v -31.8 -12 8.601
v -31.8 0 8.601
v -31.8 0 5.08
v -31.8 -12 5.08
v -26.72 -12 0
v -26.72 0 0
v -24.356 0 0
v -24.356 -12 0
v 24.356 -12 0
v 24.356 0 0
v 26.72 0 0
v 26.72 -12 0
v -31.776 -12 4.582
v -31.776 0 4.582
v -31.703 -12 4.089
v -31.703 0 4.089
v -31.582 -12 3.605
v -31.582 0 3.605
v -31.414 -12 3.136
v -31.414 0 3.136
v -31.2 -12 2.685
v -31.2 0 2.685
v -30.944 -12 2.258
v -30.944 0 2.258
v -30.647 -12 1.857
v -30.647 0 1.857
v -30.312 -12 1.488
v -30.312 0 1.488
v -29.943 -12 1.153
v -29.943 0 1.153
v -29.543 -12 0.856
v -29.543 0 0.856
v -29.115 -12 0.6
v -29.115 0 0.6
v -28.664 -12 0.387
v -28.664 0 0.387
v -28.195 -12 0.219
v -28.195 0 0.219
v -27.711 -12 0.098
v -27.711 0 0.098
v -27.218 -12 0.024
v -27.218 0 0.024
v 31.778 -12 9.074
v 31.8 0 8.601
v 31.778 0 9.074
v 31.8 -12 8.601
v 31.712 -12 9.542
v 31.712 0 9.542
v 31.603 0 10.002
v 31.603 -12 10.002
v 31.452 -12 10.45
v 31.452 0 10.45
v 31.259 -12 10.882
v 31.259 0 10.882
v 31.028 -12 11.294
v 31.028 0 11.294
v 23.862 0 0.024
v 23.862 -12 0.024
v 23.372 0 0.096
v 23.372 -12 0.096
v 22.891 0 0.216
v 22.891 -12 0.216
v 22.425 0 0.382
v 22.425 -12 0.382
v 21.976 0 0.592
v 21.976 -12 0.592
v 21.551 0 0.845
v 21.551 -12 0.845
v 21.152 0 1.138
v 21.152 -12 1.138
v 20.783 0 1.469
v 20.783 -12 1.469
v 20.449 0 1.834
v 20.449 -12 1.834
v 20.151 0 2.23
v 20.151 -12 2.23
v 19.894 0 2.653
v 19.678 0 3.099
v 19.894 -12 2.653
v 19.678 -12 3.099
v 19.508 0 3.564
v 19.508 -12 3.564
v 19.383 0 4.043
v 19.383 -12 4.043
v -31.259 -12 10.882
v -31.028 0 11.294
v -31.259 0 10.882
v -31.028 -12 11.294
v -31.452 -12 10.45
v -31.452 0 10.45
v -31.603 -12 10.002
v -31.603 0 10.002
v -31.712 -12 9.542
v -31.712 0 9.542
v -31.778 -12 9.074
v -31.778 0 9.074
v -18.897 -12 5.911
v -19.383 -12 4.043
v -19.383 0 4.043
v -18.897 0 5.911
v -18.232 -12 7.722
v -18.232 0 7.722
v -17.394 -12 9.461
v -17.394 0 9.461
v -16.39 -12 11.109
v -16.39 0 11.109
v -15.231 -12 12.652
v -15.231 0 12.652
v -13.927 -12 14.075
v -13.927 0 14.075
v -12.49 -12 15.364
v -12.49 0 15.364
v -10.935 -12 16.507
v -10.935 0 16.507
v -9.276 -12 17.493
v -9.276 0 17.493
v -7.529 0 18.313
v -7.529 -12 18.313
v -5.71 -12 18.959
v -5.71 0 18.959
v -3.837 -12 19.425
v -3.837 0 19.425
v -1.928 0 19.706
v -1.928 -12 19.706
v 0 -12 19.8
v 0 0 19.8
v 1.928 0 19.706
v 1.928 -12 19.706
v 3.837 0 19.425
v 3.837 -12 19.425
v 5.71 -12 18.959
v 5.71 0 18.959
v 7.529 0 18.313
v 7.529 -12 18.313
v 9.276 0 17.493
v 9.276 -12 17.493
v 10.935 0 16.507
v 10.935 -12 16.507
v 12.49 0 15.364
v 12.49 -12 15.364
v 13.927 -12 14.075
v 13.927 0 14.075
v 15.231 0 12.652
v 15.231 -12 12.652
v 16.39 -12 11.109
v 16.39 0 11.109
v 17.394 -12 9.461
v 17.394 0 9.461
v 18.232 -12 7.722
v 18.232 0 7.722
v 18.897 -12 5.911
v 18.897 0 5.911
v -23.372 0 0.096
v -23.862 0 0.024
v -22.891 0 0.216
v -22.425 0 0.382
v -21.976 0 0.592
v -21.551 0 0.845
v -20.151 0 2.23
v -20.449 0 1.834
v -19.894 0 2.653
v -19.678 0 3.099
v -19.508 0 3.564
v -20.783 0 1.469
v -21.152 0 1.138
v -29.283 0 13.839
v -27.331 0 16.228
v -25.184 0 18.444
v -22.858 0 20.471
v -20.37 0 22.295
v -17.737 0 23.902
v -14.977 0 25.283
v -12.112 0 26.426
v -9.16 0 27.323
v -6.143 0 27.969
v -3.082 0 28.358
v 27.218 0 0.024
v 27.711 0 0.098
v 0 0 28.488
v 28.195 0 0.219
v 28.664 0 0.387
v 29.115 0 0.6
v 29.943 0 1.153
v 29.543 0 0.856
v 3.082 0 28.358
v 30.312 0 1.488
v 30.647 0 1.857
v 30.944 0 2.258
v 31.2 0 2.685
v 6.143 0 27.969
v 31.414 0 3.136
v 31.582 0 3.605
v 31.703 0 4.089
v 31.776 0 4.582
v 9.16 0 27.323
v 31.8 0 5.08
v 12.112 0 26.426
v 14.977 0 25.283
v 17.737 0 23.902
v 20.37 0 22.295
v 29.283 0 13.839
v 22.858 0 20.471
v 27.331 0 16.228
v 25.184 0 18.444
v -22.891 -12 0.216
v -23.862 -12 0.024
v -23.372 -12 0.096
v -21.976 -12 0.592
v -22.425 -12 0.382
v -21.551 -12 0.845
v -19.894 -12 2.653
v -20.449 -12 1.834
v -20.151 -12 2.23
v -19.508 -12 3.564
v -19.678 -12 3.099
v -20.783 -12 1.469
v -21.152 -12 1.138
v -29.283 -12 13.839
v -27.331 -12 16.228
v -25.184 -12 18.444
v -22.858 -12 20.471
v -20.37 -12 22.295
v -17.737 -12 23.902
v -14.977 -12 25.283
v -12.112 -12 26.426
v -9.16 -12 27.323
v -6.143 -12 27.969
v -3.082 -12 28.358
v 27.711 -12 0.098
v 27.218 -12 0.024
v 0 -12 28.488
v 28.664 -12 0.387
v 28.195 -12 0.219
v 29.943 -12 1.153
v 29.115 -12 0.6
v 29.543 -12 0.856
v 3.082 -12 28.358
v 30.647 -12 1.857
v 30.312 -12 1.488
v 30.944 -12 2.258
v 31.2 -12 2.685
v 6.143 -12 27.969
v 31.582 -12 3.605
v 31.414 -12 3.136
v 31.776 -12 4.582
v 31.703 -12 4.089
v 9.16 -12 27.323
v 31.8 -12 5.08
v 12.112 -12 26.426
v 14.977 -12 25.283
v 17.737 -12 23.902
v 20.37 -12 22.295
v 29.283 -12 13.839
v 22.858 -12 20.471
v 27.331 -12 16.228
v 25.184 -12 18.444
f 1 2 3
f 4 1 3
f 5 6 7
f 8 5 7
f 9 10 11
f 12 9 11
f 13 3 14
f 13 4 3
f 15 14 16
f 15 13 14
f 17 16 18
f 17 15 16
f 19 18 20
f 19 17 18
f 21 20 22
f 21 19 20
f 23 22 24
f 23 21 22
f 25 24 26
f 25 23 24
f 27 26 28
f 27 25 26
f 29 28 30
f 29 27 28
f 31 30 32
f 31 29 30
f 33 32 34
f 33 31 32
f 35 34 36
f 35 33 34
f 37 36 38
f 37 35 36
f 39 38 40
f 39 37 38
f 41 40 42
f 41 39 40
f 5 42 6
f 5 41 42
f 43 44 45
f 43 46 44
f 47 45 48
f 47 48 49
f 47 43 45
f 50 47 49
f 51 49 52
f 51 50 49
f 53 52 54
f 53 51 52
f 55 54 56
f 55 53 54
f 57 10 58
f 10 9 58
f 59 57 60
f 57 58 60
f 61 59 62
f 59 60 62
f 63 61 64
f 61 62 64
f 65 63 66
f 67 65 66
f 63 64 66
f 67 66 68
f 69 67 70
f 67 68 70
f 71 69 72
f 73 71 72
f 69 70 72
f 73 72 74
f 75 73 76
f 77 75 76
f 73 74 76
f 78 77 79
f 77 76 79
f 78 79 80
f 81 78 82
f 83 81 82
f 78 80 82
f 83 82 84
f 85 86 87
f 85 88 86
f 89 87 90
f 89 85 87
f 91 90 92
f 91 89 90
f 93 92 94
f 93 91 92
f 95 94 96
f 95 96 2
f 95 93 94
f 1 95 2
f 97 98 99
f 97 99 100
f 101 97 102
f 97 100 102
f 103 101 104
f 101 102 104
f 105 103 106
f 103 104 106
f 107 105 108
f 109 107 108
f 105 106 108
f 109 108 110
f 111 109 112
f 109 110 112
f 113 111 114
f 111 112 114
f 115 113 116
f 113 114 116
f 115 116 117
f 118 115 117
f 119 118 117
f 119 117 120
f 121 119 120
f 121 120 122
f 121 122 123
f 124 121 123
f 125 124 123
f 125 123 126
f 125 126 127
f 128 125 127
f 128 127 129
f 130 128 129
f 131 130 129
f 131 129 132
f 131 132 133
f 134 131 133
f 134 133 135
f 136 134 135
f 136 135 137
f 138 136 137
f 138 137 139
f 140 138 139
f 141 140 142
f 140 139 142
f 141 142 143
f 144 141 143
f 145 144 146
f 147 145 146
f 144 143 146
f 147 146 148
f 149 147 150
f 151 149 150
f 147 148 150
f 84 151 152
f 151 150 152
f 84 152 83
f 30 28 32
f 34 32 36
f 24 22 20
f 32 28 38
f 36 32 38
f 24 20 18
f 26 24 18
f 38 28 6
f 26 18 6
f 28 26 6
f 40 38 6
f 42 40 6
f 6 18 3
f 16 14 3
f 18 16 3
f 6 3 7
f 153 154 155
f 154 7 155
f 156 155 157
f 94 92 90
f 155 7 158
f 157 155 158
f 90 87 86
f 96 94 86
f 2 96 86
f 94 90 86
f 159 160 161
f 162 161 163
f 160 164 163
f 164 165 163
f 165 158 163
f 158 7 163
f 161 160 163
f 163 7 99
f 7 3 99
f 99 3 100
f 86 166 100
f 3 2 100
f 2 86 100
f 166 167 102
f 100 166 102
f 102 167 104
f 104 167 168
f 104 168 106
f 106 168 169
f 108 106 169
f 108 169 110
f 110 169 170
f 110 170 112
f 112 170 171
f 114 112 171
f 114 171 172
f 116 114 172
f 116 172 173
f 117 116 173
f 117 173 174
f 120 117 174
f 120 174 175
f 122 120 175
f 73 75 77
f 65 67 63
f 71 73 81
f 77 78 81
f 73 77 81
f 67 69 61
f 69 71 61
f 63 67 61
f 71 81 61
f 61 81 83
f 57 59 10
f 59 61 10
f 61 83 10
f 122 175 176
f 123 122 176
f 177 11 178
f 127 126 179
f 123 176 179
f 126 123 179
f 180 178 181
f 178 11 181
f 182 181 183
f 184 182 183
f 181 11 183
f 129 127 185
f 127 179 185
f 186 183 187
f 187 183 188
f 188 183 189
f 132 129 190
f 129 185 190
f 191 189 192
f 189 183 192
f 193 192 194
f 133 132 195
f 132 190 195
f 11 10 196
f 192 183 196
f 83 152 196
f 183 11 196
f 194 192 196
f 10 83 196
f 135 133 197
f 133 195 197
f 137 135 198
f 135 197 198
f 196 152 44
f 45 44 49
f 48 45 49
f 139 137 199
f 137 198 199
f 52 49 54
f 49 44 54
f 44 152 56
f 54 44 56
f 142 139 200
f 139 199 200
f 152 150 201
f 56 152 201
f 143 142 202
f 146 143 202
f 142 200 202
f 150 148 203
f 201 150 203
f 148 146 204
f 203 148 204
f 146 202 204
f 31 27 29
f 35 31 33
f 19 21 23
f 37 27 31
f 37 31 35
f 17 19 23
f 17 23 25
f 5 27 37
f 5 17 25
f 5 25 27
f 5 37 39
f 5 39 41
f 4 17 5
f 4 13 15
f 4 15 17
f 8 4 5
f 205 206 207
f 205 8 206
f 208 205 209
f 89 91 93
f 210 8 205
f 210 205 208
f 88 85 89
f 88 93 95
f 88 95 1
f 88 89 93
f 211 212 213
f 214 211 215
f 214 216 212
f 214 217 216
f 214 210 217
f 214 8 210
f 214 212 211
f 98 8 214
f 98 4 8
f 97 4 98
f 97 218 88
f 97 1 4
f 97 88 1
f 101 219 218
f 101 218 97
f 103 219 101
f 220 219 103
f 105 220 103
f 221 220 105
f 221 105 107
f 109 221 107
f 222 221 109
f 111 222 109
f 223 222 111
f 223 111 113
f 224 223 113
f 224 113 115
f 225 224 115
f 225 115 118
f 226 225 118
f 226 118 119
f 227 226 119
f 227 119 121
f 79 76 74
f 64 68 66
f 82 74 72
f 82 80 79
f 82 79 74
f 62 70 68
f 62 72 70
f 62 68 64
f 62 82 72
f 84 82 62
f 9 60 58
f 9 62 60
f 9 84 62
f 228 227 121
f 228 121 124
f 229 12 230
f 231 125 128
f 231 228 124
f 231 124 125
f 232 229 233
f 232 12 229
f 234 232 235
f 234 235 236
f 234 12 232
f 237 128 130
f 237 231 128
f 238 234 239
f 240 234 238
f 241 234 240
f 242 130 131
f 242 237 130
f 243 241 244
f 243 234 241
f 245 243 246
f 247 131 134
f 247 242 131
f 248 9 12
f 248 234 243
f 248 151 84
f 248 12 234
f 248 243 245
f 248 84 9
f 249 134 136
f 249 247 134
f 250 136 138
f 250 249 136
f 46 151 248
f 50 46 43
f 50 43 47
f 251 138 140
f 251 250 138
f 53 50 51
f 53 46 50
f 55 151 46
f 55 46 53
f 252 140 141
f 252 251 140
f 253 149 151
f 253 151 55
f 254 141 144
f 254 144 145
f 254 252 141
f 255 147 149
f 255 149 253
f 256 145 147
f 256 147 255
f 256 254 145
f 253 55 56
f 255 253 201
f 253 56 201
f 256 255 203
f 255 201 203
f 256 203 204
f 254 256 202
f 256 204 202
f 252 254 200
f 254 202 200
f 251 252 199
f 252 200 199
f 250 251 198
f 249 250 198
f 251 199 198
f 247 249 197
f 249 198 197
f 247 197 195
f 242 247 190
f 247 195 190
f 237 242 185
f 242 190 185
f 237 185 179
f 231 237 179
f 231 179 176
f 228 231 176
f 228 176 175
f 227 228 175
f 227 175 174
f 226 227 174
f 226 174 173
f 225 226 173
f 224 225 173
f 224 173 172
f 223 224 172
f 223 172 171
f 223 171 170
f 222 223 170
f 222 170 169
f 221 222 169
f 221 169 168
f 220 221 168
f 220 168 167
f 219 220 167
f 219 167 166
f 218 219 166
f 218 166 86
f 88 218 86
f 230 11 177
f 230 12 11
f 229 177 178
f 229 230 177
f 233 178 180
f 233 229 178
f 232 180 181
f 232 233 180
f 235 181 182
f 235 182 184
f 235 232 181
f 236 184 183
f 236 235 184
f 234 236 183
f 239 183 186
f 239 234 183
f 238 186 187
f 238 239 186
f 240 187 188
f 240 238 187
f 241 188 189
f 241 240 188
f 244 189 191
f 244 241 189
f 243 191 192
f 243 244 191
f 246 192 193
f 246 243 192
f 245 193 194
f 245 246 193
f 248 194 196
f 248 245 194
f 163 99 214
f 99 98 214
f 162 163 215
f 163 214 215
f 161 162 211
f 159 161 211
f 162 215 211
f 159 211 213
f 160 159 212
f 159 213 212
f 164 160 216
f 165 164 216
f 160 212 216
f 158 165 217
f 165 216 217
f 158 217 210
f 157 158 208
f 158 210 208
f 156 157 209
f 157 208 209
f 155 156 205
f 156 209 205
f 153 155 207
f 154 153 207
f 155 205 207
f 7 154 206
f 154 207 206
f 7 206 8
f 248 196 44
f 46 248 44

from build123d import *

# Parameters (mm, degrees)
F1_DEPTH = 12
F2_R     = 5.08
F3_R     = 5.08


with BuildPart() as f1:
    # F0 (on Front) → F1 (new body)
    with BuildSketch(Plane.XZ):
        with BuildLine():
            ThreePointArc((-19.800265, 0), (0, 19.800265), (19.800265, 0))
            Line((19.800265, 0), (31.800265, 0))
            Line((31.800265, 0), (31.800265, 10))
            ThreePointArc((31.800265, 10), (0, 28.488275), (-31.800265, 10))
            Line((-31.800265, 10), (-31.800265, 0))
            Line((-31.800265, 0), (-19.800265, 0))
        make_face()
    extrude(amount=F1_DEPTH)

    # F2
    f2_edges = [f1.edges().sort_by_distance(p)[0] for p in [
        (31.800265, -6, 10),
        (31.800265, -6, 0),
        (-31.800265, -6, 10),
        (-31.800265, -6, 0),
    ]]
    fillet(f2_edges, radius=F2_R)

    # F3
    f3_edges = [f1.edges().sort_by_distance(p)[0] for p in [
        (19.800265, -6, 0),
        (-19.800265, -6, 0),
    ]]
    fillet(f3_edges, radius=F3_R)


solid = f1.part
